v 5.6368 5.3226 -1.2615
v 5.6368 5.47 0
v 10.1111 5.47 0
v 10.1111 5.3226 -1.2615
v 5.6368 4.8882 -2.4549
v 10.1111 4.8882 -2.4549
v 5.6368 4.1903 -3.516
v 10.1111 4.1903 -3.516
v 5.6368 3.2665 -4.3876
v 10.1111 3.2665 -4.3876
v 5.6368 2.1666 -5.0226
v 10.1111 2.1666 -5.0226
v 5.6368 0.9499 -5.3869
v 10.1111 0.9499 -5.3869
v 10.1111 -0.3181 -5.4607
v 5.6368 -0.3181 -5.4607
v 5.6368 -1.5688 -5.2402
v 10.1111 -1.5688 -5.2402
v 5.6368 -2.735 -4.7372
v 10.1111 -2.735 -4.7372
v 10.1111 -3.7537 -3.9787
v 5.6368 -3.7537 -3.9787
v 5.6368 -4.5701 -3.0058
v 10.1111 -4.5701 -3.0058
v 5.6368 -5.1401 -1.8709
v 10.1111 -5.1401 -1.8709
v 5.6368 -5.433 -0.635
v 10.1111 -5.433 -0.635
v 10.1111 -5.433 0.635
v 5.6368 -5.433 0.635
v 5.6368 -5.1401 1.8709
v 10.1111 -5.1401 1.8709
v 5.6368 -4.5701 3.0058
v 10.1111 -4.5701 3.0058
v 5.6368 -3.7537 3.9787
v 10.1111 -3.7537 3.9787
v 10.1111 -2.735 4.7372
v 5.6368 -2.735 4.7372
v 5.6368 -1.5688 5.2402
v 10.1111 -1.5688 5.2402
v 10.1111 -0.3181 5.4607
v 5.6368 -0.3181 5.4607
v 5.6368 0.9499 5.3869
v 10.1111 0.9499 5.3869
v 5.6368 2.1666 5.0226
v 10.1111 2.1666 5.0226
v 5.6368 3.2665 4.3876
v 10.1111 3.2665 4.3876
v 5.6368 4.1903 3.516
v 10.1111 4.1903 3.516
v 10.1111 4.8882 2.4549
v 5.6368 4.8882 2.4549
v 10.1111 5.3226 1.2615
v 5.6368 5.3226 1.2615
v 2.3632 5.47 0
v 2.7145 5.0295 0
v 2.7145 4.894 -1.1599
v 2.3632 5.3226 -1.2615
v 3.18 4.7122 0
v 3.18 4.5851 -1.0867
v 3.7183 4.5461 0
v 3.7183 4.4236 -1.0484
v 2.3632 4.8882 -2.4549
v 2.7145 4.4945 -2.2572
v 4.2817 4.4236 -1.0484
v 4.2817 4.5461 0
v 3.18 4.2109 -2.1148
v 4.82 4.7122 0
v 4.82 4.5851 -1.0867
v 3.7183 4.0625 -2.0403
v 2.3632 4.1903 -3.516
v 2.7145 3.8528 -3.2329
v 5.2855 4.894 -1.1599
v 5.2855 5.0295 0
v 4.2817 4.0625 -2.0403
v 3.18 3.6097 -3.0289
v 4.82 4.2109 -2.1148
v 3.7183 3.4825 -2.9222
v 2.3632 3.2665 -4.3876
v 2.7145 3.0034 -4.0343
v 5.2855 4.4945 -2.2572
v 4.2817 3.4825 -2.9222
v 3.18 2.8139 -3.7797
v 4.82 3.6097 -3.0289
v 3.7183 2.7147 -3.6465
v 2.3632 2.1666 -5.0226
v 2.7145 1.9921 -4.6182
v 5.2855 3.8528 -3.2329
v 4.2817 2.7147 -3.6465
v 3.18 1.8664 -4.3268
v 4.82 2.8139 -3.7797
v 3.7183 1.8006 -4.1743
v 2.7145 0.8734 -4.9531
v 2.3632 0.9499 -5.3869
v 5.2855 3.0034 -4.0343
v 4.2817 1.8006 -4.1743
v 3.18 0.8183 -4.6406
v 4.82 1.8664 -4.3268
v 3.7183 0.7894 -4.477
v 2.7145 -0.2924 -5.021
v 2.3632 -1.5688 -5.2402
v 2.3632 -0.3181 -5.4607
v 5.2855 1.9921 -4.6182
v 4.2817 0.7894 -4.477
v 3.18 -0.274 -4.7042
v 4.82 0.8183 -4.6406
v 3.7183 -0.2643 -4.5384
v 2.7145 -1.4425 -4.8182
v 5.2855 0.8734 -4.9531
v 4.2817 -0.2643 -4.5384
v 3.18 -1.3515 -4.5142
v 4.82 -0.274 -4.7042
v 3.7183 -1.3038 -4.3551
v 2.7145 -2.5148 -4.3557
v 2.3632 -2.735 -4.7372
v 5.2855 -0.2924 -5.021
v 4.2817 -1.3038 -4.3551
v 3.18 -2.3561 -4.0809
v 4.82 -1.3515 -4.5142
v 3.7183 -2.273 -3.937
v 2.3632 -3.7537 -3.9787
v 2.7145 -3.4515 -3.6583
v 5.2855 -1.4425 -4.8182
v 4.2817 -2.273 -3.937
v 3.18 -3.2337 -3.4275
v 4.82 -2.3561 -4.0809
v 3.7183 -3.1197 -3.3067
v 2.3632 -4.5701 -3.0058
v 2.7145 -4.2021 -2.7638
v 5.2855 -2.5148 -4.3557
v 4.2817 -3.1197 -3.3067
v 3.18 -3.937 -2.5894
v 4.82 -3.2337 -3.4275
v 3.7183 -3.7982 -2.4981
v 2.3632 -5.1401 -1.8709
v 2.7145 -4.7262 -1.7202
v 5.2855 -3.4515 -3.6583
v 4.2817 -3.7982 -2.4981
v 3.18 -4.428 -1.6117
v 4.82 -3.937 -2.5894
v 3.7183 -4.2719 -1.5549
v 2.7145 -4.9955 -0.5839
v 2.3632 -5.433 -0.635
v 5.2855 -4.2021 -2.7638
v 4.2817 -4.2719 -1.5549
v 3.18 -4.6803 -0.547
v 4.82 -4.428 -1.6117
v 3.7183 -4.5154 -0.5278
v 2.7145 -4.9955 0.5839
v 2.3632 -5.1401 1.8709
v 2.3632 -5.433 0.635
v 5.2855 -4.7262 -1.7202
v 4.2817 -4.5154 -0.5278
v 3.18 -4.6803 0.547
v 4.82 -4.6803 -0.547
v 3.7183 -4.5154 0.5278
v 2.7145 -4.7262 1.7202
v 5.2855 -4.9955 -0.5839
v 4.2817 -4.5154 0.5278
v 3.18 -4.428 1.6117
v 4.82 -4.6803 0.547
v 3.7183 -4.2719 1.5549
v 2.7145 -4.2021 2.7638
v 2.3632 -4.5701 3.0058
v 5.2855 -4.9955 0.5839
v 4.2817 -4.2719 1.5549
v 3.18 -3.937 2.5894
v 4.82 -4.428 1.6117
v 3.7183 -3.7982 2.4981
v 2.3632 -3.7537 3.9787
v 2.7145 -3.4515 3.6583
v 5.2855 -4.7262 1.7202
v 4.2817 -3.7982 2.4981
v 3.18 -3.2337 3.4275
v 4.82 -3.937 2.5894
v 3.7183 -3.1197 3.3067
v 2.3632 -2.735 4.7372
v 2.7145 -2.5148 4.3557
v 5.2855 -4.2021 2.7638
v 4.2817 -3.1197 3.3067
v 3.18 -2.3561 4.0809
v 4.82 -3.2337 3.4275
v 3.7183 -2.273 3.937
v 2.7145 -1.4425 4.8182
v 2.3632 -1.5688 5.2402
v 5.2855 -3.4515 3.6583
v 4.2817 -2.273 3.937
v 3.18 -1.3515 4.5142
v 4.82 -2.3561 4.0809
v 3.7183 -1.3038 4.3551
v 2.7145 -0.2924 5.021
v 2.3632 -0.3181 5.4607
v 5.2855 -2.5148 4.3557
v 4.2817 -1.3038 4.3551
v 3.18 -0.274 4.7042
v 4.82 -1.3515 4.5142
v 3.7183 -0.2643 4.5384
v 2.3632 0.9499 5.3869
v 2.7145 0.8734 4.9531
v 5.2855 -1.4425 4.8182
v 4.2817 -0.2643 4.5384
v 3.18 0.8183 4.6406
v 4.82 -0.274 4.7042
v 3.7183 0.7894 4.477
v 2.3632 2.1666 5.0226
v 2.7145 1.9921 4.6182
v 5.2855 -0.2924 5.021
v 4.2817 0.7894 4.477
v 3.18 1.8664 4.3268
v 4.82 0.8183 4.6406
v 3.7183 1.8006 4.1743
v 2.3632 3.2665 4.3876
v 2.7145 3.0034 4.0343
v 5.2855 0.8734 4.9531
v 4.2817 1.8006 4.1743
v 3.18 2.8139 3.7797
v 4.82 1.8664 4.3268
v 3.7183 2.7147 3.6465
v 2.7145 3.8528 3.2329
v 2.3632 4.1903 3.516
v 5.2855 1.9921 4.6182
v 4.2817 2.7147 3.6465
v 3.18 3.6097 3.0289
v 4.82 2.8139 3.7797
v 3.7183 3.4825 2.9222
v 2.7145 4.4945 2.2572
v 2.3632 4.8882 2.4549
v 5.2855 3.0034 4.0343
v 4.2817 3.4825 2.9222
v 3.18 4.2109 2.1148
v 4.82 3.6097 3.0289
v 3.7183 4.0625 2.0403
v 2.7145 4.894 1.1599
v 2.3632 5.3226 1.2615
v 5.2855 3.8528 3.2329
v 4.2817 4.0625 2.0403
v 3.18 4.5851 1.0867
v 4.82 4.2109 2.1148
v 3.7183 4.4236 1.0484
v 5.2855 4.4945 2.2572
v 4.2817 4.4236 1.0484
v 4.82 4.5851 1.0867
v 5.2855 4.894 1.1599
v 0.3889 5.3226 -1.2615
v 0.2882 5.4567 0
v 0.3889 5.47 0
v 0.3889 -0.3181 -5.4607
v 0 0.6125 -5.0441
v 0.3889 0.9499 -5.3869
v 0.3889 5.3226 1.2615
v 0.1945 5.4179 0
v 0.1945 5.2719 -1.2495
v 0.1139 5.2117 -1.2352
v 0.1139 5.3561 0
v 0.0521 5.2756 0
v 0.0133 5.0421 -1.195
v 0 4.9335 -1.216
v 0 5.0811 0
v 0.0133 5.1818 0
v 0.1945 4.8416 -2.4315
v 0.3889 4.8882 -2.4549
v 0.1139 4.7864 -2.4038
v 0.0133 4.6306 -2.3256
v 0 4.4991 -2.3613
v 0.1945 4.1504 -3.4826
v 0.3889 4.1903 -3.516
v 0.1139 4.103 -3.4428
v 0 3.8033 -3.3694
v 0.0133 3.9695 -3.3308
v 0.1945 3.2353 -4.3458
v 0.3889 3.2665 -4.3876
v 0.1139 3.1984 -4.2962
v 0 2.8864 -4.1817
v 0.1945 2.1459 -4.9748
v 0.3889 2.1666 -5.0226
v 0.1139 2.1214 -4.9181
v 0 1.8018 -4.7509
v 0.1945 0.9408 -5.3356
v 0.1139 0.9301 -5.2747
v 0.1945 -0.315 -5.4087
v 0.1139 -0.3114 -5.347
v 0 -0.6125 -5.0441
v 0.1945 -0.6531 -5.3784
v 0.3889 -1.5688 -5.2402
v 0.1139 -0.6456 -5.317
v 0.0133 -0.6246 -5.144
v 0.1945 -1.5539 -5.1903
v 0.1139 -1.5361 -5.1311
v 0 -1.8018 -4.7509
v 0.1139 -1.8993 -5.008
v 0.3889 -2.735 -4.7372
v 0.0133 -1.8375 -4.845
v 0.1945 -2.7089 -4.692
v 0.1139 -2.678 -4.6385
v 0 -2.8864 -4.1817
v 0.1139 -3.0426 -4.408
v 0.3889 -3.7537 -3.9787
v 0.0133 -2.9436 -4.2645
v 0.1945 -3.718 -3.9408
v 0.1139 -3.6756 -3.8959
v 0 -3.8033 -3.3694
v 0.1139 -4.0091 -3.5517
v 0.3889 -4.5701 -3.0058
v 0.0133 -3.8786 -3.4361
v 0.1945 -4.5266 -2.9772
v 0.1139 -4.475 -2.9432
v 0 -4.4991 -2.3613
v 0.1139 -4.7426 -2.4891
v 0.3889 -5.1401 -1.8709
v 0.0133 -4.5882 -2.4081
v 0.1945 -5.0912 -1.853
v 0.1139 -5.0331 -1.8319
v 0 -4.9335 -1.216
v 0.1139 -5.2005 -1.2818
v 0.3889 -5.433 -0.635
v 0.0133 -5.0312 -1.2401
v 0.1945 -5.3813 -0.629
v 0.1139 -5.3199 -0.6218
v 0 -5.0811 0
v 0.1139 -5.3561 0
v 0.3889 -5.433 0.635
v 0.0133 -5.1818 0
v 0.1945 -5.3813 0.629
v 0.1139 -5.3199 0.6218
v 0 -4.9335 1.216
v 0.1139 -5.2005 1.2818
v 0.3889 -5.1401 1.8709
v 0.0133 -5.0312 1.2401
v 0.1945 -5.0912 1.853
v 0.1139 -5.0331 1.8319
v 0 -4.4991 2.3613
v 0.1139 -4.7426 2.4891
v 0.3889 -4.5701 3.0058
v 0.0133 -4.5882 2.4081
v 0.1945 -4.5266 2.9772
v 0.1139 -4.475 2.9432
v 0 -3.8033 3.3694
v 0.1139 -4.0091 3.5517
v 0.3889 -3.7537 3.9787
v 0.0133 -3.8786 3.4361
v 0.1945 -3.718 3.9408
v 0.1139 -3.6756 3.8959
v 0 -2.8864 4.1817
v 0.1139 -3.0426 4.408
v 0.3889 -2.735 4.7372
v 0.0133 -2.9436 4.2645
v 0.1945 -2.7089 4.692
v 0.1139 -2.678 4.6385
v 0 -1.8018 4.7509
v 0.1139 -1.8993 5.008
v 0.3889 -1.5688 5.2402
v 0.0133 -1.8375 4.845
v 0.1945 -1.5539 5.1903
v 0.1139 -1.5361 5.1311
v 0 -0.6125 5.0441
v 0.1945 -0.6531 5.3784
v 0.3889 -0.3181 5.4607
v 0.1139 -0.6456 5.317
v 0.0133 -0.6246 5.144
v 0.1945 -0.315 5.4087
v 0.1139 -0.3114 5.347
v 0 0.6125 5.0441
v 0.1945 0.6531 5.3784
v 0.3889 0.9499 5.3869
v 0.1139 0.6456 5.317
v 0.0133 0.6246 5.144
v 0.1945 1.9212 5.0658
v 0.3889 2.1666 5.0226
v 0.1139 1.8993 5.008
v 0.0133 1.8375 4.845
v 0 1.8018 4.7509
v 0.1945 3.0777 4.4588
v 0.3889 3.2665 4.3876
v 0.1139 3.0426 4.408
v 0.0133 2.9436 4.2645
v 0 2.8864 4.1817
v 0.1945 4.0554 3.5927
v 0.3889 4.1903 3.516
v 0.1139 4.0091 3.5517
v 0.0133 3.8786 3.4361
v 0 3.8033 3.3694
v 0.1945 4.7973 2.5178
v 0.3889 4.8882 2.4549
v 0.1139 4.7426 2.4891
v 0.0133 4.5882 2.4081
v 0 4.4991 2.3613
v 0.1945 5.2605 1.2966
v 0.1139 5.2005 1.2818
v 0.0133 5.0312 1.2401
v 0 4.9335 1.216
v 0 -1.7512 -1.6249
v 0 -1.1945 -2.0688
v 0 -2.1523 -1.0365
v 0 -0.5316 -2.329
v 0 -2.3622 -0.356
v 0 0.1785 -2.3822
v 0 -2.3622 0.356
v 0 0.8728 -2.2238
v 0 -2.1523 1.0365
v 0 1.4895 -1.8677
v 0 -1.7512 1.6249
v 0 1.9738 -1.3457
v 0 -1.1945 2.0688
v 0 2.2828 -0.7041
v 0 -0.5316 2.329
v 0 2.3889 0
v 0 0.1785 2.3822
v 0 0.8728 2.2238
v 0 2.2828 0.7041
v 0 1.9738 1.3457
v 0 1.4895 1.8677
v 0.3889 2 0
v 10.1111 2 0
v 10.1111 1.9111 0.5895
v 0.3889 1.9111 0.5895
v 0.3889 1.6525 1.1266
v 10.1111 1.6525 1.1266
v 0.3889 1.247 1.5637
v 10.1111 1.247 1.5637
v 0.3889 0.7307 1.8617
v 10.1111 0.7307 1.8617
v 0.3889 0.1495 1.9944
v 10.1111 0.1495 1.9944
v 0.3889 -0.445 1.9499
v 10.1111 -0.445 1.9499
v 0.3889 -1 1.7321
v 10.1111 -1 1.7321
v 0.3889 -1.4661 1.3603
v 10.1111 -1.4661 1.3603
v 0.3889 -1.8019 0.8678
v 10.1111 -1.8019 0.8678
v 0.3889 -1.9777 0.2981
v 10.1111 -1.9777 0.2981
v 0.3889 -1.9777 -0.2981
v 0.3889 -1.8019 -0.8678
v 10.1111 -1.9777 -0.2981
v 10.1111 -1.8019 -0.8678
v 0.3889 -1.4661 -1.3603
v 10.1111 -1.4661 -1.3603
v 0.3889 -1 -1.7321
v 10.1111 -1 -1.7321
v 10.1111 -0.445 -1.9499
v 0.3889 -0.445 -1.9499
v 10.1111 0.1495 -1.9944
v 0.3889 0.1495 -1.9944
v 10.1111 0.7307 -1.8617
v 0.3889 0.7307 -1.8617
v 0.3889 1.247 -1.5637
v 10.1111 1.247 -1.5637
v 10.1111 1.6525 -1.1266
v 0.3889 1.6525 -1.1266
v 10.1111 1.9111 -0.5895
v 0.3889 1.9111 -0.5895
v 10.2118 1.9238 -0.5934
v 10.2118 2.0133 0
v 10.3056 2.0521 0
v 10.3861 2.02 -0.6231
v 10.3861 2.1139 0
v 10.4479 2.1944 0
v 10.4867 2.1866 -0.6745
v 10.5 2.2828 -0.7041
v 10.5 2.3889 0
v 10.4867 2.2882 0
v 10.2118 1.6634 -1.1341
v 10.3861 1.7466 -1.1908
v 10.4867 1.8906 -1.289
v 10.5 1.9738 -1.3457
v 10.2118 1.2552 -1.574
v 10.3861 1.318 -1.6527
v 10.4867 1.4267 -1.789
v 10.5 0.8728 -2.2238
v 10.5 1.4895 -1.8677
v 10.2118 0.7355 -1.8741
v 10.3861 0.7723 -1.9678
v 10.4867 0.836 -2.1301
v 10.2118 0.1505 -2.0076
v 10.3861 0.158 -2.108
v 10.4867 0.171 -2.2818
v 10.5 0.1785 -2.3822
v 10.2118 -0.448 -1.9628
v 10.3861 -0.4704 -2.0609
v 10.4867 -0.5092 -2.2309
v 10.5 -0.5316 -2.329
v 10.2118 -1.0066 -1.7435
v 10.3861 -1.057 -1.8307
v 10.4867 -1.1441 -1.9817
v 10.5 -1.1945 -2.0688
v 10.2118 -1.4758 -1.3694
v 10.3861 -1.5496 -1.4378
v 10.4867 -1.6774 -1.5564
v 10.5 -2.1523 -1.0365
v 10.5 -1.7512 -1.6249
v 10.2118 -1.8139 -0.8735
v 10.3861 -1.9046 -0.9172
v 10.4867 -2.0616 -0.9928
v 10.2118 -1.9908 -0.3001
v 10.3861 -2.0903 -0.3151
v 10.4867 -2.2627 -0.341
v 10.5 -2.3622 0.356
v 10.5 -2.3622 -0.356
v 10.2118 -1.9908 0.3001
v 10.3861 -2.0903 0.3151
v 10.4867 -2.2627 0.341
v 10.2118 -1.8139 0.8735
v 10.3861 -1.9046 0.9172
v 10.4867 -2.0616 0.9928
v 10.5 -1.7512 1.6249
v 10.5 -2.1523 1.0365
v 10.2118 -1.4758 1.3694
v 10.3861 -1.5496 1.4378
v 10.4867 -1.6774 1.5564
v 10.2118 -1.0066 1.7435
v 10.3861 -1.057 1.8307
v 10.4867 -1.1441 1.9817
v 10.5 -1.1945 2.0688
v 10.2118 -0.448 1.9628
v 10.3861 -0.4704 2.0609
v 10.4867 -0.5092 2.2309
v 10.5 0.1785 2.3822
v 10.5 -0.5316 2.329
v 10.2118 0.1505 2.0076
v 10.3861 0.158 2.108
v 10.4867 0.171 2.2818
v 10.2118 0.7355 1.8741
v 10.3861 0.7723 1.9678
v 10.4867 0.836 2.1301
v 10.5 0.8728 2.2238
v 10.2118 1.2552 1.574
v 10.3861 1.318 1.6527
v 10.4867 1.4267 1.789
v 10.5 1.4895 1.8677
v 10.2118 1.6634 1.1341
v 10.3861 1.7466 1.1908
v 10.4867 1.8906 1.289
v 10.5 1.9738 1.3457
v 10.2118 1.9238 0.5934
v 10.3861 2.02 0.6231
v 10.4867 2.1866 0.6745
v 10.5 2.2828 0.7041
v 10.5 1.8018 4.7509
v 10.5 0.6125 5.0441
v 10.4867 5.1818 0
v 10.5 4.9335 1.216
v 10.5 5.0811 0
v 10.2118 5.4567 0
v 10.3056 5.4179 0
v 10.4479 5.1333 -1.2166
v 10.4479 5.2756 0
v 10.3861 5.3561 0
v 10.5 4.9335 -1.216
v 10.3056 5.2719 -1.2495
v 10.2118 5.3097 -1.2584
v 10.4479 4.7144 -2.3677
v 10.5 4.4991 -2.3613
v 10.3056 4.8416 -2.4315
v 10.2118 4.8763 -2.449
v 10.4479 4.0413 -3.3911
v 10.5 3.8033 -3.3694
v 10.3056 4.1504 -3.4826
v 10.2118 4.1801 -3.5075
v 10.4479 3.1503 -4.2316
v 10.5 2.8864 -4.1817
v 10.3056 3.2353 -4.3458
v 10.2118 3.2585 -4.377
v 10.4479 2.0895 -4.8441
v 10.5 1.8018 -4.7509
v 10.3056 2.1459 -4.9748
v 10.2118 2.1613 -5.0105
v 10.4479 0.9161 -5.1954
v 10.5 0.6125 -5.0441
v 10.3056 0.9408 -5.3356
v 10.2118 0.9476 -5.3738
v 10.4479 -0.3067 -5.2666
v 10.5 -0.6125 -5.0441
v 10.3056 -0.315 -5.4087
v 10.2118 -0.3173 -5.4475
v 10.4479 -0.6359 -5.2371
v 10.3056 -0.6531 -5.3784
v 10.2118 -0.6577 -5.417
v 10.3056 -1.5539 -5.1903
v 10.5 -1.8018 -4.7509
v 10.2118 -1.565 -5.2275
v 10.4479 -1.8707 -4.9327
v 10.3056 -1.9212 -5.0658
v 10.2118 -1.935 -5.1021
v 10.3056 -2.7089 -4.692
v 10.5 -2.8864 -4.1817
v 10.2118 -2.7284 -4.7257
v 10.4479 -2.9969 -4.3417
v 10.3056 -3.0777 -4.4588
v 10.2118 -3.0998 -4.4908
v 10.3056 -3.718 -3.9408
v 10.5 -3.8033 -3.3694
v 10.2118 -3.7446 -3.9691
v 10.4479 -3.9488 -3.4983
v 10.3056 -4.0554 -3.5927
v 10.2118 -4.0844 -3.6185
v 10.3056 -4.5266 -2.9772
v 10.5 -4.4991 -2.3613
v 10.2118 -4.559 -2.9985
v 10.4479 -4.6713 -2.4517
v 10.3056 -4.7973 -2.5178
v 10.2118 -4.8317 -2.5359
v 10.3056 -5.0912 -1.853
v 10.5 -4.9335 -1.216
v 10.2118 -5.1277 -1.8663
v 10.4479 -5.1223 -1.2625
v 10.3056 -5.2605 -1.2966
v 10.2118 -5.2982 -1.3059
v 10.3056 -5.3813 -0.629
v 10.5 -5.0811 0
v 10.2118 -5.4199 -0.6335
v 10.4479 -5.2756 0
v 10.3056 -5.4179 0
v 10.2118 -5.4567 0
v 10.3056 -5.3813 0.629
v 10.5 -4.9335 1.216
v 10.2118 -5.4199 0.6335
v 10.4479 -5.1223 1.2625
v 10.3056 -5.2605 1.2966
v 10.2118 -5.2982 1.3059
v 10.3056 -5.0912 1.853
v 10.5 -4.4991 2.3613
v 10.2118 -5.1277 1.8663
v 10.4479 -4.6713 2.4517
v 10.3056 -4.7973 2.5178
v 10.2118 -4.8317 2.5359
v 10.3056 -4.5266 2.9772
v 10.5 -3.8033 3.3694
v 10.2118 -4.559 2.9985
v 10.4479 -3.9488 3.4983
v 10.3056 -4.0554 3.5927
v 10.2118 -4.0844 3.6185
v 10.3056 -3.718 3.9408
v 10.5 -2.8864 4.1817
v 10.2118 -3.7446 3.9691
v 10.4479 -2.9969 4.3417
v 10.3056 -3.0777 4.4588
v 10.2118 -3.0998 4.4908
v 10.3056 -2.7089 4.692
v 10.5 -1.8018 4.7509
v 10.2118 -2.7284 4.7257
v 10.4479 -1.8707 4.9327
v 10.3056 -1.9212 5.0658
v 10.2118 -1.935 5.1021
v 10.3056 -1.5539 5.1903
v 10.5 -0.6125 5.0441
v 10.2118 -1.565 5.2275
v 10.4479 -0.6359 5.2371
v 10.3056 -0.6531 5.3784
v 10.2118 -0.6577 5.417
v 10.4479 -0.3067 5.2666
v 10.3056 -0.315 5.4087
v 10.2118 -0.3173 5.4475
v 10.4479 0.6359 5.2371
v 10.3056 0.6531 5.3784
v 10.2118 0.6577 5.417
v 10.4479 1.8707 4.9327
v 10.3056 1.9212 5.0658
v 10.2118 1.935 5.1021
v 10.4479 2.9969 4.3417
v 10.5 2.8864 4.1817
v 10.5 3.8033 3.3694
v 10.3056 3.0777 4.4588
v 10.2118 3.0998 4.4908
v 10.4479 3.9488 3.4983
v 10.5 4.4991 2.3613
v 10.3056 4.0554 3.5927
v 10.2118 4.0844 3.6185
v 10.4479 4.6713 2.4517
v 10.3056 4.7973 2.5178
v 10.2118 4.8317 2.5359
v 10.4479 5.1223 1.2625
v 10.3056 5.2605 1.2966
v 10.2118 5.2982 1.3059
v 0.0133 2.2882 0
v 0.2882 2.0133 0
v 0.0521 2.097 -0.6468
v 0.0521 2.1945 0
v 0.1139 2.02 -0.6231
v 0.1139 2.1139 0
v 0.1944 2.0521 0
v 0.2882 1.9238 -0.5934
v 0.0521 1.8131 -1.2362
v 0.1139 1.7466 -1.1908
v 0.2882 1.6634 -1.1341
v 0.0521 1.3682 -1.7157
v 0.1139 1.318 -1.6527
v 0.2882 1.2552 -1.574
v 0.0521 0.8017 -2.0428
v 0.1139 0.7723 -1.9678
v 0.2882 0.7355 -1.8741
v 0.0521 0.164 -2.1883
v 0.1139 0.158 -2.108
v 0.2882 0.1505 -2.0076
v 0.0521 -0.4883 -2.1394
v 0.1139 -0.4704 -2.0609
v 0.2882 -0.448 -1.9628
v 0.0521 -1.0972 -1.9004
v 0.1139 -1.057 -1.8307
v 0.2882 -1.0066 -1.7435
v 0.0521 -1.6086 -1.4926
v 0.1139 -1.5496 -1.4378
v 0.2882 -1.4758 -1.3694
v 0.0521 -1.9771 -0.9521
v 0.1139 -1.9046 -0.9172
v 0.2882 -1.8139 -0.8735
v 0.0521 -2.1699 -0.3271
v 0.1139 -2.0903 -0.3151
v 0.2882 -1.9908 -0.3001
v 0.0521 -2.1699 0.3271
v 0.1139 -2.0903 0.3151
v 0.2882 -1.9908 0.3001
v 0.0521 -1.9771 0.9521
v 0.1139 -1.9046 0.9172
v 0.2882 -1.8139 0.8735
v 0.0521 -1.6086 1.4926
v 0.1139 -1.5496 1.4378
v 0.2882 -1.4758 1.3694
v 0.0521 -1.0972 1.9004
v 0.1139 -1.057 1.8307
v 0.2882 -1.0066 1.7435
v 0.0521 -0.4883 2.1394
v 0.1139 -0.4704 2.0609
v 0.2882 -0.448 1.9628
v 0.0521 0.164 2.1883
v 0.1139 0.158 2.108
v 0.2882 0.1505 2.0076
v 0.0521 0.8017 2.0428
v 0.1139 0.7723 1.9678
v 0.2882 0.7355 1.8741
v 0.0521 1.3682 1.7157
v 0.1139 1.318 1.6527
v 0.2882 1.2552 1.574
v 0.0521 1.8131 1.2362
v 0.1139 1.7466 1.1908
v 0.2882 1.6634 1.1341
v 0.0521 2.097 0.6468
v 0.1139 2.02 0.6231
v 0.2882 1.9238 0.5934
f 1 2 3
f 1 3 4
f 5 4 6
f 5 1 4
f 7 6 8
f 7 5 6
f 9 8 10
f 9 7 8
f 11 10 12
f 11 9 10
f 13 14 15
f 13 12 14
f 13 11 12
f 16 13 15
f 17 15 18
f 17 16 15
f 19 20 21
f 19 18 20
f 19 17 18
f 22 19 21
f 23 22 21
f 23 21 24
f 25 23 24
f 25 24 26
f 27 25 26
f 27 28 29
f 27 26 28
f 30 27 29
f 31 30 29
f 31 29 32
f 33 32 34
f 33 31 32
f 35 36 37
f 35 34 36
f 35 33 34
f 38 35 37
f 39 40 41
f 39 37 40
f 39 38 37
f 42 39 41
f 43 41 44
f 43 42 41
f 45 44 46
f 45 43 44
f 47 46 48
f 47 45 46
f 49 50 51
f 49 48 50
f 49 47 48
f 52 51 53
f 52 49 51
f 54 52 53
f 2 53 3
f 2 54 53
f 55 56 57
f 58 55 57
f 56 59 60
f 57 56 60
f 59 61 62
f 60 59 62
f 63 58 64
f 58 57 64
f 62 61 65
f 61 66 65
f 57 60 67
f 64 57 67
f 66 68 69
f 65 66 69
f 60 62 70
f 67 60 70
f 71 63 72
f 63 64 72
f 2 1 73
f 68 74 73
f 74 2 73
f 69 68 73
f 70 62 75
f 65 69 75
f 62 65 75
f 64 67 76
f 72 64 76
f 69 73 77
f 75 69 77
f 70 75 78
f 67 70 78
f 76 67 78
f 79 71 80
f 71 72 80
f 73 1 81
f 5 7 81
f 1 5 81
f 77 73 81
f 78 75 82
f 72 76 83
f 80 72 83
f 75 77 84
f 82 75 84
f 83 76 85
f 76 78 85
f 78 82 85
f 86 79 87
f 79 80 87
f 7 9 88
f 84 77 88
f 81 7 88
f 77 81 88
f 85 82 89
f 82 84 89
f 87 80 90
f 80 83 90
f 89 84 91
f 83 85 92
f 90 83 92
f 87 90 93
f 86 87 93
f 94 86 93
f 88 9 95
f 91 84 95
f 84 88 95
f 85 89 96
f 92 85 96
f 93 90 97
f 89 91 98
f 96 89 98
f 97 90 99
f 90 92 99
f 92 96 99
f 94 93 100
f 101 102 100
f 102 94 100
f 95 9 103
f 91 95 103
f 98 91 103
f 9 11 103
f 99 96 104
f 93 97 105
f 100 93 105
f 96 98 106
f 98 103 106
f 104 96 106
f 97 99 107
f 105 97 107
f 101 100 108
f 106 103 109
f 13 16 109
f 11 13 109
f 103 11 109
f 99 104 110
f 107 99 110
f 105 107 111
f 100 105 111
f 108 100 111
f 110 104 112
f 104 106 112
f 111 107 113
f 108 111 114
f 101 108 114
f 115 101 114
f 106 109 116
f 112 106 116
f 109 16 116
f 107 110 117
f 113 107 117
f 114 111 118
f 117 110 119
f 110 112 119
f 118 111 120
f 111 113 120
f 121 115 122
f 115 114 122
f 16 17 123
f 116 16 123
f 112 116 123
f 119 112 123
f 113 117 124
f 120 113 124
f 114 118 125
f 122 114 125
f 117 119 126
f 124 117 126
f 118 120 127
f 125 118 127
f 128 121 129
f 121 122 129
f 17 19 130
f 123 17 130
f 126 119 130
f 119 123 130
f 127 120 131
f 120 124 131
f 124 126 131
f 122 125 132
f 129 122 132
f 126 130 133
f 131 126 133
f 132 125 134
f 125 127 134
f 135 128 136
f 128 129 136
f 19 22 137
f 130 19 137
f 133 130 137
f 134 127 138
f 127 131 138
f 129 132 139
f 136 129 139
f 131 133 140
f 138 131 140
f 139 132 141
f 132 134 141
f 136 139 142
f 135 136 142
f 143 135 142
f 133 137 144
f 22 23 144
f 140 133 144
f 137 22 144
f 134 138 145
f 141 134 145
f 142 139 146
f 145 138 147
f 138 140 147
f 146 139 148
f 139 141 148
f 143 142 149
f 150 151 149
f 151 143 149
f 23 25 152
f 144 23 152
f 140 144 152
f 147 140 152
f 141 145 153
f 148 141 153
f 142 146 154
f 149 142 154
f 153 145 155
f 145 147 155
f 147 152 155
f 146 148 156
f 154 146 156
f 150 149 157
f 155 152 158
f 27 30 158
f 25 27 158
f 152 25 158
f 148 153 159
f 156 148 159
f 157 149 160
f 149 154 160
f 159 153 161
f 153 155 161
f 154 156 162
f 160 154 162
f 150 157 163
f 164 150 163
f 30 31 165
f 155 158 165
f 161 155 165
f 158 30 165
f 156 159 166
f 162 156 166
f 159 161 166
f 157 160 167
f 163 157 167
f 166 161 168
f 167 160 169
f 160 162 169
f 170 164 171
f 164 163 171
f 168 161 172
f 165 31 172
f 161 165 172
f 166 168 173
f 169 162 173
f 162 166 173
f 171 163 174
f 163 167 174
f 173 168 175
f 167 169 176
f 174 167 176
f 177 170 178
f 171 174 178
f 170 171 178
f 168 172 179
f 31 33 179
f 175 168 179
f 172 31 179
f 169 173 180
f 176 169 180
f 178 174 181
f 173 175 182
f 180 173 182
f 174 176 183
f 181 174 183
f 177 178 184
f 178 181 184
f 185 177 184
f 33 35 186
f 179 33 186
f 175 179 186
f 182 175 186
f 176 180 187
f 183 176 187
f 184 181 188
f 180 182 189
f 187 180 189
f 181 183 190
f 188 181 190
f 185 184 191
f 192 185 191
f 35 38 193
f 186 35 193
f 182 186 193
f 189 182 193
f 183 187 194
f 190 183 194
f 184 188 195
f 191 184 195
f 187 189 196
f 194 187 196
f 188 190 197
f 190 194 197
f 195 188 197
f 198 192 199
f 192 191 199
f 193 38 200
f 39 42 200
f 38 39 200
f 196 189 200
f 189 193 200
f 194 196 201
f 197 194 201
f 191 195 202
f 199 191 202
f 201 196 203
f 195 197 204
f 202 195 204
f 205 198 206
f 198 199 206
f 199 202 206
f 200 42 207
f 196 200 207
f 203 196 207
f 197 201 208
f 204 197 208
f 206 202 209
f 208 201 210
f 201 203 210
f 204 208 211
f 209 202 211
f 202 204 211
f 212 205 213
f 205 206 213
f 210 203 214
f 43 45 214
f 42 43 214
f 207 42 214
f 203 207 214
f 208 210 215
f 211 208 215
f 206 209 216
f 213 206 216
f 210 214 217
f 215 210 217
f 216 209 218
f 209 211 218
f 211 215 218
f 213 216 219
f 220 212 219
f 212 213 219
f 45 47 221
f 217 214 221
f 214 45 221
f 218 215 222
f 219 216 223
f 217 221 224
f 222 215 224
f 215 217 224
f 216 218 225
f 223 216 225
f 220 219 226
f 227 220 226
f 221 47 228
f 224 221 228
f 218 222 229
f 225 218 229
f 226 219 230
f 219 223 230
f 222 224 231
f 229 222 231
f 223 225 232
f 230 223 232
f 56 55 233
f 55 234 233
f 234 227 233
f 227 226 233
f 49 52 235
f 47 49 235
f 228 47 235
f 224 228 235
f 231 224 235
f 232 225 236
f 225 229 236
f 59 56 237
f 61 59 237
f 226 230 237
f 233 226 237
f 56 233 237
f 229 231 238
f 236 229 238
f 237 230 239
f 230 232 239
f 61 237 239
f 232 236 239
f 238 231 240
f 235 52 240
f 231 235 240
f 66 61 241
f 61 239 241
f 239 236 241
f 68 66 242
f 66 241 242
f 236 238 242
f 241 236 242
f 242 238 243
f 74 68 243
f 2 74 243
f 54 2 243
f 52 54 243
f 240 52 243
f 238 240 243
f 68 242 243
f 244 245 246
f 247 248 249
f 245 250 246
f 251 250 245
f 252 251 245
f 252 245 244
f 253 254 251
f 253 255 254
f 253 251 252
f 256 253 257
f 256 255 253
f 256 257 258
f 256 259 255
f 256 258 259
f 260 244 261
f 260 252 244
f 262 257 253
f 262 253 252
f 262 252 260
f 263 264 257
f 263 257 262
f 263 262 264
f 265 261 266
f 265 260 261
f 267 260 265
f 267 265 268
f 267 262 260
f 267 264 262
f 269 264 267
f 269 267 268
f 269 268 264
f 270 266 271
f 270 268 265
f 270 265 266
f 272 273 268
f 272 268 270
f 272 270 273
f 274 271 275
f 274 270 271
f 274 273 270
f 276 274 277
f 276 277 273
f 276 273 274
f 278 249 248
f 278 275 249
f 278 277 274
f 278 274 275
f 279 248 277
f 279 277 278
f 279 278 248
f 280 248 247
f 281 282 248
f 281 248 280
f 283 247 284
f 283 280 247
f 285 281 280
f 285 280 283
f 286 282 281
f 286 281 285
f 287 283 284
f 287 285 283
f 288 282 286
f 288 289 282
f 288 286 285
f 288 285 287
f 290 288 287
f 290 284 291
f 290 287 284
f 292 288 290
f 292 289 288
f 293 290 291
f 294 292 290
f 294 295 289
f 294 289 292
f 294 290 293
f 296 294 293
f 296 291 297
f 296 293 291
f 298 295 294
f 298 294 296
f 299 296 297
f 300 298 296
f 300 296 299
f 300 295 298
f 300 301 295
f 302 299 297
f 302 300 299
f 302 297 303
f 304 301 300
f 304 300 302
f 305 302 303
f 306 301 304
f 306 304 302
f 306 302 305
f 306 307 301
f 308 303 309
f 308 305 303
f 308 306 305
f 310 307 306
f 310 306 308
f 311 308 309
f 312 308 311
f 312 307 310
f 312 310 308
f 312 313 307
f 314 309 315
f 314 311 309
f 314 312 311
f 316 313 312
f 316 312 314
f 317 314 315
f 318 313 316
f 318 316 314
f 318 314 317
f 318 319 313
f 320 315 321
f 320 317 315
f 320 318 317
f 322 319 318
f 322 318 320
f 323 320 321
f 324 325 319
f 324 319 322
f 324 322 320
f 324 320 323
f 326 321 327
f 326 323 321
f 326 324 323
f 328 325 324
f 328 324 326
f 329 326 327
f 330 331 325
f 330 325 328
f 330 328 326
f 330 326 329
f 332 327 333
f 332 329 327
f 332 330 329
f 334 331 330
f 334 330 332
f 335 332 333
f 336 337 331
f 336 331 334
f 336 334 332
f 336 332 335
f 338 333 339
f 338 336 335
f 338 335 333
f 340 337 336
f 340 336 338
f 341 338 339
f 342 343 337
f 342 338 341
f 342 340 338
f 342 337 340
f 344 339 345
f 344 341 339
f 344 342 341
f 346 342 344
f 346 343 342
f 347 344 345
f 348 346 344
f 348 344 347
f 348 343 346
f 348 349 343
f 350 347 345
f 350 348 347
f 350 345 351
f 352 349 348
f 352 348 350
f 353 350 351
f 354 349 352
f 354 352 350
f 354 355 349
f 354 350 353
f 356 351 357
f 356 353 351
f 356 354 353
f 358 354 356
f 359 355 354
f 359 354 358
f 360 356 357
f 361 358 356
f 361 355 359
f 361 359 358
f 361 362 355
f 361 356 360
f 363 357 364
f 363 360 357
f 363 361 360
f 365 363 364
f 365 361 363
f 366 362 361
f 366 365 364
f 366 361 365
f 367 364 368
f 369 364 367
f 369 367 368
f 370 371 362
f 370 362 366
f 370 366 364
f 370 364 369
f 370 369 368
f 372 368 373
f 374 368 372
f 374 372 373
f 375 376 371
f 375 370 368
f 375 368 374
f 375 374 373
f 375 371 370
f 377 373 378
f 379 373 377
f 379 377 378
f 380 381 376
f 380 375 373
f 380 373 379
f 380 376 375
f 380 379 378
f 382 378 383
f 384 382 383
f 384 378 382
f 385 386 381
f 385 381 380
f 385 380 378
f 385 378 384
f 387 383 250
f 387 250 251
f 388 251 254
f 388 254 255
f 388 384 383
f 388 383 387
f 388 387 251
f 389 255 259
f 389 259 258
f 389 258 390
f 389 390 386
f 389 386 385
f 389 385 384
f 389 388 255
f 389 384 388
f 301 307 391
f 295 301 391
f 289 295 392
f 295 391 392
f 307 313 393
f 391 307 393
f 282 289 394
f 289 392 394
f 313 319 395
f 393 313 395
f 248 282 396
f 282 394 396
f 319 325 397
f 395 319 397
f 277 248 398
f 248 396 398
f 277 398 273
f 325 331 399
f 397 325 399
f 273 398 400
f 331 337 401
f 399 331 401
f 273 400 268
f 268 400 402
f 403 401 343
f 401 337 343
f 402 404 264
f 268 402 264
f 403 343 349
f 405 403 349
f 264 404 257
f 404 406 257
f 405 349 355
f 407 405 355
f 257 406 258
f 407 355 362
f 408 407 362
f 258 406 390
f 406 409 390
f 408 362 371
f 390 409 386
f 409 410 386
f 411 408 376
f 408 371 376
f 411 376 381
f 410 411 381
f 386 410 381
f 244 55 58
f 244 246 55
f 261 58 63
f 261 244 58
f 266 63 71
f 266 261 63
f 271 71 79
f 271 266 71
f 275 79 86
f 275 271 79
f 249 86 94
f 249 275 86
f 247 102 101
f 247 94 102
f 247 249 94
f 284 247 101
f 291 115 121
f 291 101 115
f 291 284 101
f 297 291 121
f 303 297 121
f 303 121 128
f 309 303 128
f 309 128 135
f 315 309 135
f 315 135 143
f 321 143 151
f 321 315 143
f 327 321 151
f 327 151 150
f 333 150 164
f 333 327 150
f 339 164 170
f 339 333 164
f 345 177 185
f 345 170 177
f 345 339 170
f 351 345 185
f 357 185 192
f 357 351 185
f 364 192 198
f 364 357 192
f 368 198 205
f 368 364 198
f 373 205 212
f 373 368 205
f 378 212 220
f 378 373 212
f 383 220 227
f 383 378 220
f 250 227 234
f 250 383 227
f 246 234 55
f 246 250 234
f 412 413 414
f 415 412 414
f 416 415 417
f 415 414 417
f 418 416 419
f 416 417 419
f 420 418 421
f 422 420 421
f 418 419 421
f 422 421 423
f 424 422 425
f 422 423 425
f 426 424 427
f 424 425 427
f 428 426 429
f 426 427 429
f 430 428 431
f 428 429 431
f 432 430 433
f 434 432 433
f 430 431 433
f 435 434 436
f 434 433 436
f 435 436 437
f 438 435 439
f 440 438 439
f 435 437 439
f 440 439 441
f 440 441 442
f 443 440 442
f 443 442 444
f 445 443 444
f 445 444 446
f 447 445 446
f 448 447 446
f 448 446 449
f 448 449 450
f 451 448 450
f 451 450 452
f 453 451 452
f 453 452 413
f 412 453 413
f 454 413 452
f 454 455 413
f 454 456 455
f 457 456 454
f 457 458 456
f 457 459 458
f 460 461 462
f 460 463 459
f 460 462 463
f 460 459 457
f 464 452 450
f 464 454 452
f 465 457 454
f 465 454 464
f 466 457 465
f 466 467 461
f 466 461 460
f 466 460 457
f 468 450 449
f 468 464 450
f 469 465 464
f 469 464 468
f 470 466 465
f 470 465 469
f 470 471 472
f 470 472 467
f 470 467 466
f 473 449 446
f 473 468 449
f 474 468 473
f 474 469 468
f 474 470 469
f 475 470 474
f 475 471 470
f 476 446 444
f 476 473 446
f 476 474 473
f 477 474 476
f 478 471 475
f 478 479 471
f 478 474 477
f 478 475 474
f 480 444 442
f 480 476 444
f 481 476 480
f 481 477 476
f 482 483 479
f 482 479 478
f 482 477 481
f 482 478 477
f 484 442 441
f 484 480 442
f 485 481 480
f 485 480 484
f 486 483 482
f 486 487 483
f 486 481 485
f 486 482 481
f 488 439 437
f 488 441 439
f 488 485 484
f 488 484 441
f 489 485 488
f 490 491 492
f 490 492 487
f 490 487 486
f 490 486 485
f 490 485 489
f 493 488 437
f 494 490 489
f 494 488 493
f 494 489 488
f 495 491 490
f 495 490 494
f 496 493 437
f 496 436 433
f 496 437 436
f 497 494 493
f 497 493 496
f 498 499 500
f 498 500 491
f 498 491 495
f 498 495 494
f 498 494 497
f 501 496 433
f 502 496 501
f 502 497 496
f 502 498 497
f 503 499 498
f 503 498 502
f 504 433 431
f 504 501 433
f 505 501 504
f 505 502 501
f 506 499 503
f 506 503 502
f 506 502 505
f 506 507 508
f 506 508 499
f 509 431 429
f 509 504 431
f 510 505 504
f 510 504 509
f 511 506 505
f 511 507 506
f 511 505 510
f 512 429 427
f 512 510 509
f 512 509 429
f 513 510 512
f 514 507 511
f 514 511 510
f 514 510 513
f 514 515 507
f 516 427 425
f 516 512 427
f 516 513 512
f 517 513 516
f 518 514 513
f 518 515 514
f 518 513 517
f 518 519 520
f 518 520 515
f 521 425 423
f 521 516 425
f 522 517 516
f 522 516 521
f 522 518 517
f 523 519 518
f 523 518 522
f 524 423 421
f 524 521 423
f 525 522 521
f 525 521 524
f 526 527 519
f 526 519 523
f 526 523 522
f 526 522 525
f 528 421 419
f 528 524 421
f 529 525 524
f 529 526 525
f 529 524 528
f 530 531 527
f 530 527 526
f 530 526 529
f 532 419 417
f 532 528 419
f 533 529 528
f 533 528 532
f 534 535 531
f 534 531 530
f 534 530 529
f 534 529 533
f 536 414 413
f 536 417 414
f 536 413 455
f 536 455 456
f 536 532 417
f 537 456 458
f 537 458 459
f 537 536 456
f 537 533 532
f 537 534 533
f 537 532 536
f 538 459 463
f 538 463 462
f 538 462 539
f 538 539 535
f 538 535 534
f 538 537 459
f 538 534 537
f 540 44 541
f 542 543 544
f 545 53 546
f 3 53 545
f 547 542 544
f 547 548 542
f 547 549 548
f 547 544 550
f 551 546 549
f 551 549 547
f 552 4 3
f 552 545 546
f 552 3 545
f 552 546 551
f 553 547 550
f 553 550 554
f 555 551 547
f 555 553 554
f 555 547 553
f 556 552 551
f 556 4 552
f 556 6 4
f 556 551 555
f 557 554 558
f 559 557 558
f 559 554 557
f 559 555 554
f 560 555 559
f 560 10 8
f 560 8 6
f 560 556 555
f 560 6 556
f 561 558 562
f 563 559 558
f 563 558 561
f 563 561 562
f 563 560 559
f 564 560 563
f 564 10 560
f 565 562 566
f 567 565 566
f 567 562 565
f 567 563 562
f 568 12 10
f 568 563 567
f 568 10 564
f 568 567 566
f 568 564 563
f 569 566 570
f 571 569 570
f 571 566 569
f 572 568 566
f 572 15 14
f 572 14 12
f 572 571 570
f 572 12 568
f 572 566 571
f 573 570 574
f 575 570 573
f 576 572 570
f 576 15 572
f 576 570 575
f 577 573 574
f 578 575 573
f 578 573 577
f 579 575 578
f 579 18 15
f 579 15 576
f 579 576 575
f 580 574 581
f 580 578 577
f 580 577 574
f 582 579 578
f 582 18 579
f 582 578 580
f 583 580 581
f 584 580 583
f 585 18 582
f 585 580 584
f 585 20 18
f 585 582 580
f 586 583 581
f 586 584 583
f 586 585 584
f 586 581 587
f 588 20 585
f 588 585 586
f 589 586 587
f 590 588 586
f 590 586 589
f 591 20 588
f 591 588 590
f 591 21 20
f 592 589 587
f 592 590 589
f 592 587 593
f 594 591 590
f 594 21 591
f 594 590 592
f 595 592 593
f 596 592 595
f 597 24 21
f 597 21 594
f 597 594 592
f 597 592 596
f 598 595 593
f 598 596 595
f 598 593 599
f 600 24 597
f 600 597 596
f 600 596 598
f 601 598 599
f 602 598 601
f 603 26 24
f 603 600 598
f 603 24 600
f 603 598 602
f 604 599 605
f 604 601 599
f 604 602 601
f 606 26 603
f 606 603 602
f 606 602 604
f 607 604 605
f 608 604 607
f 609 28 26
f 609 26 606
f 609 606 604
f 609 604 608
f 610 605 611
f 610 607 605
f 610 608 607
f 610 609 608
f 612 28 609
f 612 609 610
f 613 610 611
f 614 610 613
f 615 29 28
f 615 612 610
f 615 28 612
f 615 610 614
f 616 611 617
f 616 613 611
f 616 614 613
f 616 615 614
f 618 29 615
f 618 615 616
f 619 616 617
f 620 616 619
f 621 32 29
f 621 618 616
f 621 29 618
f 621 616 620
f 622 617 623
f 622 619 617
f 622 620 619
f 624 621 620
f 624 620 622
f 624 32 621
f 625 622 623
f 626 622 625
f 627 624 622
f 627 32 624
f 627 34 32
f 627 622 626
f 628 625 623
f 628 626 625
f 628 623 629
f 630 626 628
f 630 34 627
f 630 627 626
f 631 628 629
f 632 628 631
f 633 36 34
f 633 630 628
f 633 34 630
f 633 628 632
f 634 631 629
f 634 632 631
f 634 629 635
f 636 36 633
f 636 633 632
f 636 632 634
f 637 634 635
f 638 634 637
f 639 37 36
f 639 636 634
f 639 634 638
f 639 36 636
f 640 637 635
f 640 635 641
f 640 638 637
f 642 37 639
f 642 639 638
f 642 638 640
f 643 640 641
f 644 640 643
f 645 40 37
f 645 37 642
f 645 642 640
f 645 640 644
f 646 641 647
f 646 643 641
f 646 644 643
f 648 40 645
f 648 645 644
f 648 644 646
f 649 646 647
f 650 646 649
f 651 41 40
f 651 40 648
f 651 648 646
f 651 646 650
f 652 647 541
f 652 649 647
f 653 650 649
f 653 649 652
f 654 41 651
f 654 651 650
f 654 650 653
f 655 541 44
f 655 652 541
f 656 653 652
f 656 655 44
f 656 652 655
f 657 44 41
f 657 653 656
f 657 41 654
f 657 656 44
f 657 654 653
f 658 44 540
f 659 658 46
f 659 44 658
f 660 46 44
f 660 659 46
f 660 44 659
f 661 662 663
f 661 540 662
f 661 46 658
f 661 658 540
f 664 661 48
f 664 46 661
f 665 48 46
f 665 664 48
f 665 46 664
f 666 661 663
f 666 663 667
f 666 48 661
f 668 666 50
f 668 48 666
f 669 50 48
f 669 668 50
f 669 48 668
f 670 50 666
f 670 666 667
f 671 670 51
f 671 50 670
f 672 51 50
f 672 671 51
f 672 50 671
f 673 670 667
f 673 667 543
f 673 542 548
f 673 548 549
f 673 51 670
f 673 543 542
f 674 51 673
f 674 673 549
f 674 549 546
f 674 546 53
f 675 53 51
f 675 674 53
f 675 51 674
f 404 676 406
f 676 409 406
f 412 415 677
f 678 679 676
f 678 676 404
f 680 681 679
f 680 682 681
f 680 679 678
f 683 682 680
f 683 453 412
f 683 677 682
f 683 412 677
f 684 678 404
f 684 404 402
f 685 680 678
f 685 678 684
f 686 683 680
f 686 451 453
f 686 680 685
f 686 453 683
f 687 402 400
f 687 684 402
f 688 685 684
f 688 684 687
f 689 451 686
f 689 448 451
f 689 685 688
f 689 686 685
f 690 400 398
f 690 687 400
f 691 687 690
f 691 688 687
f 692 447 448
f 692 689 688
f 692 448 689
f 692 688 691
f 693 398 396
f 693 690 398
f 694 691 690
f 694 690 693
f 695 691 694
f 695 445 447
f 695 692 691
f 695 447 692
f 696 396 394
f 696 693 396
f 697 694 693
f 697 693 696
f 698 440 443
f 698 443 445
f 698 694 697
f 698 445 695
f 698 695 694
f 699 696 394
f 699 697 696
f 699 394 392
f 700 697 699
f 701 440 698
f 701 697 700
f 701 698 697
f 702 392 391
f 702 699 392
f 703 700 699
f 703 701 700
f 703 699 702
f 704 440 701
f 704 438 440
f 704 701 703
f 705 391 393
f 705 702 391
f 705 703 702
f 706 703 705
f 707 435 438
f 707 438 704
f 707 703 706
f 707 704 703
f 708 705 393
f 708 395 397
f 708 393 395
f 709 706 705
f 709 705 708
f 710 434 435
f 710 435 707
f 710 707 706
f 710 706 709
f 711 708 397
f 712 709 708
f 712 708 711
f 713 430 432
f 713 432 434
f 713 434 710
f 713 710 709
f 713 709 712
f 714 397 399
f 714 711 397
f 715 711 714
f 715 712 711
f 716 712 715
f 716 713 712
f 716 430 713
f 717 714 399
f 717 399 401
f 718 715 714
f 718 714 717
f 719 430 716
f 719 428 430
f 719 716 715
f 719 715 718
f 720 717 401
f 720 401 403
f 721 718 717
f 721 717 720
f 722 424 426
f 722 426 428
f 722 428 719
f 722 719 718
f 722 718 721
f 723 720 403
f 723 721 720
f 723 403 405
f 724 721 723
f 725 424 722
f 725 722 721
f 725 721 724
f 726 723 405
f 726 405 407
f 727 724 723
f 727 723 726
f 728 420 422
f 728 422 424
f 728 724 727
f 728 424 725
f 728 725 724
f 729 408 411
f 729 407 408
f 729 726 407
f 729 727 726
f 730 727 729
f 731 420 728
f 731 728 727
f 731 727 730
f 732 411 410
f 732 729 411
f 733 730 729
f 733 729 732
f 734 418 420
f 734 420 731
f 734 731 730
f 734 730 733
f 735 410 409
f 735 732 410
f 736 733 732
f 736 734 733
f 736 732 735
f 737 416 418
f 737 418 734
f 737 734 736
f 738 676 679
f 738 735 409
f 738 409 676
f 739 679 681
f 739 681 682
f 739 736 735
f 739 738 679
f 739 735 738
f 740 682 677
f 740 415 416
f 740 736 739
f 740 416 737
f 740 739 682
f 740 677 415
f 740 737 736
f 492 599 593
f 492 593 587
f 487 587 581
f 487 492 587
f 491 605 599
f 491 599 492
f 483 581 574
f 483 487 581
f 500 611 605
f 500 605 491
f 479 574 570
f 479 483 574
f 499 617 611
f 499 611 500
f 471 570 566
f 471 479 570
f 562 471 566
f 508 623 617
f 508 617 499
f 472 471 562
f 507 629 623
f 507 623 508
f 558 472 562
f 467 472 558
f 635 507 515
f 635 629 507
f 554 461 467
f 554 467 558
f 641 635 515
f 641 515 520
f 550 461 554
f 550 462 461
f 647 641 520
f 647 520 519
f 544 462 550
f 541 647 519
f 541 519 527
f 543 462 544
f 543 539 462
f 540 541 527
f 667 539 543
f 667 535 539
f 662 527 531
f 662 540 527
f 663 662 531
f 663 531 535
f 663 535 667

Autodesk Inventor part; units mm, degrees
sketch "Sketch_4" plane through (0, 0, 0) normal (0, 0, 1) x (1, 0, 0)
  line L0 (10.5, 0) -> (0, 0)
  arc A0 (0, 2.3889) -> (0.3889, 2) centre (0.3889, 2.3889) ccw
  line L1 (0.3889, 2) -> (10.1111, 2)
  arc A1 (10.1111, 2) -> (10.5, 2.3889) centre (10.1111, 2.3889) ccw
  line L2 (10.5, 2.3889) -> (10.5, 5.0811)
  arc A2 (10.5, 5.0811) -> (10.1111, 5.47) centre (10.1111, 5.0811) ccw
  line L3 (10.1111, 5.47) -> (5.6368, 5.47)
  arc A3 (2.3632, 5.47) -> (5.6368, 5.47) centre (4, 6.415) ccw
  line L4 (2.3632, 5.47) -> (0.3889, 5.47)
  arc A4 (0.3889, 5.47) -> (0, 5.0811) centre (0.3889, 5.0811) ccw
  line L5 (0, 5.0811) -> (0, 2.3889)
revolve "Revolution1" add sketch "Sketch_4" angle 360 about axis through (10.5, 0, 0) along (1, 0, 0)
ref_plane "Dummy_IR_XY" through (0, 0, 0) normal (1, 0, 0) x (0, 0, -1)
ref_plane "Dummy_IR_YZ" through (0, 0, 0) normal (0, 0, -1) x (0, 1, 0)
ref_plane "Dummy_IR_ZX" through (0, 0, 0) normal (0, 1, 0) x (1, 0, 0)
ref_plane "IR_OR_XY" through (0, 0, 0) normal (1, 0, 0) x (0, 0, -1)
ref_plane "IR_OR_YZ" through (0, 0, 0) normal (0, 0, -1) x (0, 1, 0)
ref_plane "IR_OR_ZX" through (0, 0, 0) normal (0, 1, 0) x (1, 0, 0)
properties part number "040400DR-22-H4W(0_5)3_ir_CPY"
